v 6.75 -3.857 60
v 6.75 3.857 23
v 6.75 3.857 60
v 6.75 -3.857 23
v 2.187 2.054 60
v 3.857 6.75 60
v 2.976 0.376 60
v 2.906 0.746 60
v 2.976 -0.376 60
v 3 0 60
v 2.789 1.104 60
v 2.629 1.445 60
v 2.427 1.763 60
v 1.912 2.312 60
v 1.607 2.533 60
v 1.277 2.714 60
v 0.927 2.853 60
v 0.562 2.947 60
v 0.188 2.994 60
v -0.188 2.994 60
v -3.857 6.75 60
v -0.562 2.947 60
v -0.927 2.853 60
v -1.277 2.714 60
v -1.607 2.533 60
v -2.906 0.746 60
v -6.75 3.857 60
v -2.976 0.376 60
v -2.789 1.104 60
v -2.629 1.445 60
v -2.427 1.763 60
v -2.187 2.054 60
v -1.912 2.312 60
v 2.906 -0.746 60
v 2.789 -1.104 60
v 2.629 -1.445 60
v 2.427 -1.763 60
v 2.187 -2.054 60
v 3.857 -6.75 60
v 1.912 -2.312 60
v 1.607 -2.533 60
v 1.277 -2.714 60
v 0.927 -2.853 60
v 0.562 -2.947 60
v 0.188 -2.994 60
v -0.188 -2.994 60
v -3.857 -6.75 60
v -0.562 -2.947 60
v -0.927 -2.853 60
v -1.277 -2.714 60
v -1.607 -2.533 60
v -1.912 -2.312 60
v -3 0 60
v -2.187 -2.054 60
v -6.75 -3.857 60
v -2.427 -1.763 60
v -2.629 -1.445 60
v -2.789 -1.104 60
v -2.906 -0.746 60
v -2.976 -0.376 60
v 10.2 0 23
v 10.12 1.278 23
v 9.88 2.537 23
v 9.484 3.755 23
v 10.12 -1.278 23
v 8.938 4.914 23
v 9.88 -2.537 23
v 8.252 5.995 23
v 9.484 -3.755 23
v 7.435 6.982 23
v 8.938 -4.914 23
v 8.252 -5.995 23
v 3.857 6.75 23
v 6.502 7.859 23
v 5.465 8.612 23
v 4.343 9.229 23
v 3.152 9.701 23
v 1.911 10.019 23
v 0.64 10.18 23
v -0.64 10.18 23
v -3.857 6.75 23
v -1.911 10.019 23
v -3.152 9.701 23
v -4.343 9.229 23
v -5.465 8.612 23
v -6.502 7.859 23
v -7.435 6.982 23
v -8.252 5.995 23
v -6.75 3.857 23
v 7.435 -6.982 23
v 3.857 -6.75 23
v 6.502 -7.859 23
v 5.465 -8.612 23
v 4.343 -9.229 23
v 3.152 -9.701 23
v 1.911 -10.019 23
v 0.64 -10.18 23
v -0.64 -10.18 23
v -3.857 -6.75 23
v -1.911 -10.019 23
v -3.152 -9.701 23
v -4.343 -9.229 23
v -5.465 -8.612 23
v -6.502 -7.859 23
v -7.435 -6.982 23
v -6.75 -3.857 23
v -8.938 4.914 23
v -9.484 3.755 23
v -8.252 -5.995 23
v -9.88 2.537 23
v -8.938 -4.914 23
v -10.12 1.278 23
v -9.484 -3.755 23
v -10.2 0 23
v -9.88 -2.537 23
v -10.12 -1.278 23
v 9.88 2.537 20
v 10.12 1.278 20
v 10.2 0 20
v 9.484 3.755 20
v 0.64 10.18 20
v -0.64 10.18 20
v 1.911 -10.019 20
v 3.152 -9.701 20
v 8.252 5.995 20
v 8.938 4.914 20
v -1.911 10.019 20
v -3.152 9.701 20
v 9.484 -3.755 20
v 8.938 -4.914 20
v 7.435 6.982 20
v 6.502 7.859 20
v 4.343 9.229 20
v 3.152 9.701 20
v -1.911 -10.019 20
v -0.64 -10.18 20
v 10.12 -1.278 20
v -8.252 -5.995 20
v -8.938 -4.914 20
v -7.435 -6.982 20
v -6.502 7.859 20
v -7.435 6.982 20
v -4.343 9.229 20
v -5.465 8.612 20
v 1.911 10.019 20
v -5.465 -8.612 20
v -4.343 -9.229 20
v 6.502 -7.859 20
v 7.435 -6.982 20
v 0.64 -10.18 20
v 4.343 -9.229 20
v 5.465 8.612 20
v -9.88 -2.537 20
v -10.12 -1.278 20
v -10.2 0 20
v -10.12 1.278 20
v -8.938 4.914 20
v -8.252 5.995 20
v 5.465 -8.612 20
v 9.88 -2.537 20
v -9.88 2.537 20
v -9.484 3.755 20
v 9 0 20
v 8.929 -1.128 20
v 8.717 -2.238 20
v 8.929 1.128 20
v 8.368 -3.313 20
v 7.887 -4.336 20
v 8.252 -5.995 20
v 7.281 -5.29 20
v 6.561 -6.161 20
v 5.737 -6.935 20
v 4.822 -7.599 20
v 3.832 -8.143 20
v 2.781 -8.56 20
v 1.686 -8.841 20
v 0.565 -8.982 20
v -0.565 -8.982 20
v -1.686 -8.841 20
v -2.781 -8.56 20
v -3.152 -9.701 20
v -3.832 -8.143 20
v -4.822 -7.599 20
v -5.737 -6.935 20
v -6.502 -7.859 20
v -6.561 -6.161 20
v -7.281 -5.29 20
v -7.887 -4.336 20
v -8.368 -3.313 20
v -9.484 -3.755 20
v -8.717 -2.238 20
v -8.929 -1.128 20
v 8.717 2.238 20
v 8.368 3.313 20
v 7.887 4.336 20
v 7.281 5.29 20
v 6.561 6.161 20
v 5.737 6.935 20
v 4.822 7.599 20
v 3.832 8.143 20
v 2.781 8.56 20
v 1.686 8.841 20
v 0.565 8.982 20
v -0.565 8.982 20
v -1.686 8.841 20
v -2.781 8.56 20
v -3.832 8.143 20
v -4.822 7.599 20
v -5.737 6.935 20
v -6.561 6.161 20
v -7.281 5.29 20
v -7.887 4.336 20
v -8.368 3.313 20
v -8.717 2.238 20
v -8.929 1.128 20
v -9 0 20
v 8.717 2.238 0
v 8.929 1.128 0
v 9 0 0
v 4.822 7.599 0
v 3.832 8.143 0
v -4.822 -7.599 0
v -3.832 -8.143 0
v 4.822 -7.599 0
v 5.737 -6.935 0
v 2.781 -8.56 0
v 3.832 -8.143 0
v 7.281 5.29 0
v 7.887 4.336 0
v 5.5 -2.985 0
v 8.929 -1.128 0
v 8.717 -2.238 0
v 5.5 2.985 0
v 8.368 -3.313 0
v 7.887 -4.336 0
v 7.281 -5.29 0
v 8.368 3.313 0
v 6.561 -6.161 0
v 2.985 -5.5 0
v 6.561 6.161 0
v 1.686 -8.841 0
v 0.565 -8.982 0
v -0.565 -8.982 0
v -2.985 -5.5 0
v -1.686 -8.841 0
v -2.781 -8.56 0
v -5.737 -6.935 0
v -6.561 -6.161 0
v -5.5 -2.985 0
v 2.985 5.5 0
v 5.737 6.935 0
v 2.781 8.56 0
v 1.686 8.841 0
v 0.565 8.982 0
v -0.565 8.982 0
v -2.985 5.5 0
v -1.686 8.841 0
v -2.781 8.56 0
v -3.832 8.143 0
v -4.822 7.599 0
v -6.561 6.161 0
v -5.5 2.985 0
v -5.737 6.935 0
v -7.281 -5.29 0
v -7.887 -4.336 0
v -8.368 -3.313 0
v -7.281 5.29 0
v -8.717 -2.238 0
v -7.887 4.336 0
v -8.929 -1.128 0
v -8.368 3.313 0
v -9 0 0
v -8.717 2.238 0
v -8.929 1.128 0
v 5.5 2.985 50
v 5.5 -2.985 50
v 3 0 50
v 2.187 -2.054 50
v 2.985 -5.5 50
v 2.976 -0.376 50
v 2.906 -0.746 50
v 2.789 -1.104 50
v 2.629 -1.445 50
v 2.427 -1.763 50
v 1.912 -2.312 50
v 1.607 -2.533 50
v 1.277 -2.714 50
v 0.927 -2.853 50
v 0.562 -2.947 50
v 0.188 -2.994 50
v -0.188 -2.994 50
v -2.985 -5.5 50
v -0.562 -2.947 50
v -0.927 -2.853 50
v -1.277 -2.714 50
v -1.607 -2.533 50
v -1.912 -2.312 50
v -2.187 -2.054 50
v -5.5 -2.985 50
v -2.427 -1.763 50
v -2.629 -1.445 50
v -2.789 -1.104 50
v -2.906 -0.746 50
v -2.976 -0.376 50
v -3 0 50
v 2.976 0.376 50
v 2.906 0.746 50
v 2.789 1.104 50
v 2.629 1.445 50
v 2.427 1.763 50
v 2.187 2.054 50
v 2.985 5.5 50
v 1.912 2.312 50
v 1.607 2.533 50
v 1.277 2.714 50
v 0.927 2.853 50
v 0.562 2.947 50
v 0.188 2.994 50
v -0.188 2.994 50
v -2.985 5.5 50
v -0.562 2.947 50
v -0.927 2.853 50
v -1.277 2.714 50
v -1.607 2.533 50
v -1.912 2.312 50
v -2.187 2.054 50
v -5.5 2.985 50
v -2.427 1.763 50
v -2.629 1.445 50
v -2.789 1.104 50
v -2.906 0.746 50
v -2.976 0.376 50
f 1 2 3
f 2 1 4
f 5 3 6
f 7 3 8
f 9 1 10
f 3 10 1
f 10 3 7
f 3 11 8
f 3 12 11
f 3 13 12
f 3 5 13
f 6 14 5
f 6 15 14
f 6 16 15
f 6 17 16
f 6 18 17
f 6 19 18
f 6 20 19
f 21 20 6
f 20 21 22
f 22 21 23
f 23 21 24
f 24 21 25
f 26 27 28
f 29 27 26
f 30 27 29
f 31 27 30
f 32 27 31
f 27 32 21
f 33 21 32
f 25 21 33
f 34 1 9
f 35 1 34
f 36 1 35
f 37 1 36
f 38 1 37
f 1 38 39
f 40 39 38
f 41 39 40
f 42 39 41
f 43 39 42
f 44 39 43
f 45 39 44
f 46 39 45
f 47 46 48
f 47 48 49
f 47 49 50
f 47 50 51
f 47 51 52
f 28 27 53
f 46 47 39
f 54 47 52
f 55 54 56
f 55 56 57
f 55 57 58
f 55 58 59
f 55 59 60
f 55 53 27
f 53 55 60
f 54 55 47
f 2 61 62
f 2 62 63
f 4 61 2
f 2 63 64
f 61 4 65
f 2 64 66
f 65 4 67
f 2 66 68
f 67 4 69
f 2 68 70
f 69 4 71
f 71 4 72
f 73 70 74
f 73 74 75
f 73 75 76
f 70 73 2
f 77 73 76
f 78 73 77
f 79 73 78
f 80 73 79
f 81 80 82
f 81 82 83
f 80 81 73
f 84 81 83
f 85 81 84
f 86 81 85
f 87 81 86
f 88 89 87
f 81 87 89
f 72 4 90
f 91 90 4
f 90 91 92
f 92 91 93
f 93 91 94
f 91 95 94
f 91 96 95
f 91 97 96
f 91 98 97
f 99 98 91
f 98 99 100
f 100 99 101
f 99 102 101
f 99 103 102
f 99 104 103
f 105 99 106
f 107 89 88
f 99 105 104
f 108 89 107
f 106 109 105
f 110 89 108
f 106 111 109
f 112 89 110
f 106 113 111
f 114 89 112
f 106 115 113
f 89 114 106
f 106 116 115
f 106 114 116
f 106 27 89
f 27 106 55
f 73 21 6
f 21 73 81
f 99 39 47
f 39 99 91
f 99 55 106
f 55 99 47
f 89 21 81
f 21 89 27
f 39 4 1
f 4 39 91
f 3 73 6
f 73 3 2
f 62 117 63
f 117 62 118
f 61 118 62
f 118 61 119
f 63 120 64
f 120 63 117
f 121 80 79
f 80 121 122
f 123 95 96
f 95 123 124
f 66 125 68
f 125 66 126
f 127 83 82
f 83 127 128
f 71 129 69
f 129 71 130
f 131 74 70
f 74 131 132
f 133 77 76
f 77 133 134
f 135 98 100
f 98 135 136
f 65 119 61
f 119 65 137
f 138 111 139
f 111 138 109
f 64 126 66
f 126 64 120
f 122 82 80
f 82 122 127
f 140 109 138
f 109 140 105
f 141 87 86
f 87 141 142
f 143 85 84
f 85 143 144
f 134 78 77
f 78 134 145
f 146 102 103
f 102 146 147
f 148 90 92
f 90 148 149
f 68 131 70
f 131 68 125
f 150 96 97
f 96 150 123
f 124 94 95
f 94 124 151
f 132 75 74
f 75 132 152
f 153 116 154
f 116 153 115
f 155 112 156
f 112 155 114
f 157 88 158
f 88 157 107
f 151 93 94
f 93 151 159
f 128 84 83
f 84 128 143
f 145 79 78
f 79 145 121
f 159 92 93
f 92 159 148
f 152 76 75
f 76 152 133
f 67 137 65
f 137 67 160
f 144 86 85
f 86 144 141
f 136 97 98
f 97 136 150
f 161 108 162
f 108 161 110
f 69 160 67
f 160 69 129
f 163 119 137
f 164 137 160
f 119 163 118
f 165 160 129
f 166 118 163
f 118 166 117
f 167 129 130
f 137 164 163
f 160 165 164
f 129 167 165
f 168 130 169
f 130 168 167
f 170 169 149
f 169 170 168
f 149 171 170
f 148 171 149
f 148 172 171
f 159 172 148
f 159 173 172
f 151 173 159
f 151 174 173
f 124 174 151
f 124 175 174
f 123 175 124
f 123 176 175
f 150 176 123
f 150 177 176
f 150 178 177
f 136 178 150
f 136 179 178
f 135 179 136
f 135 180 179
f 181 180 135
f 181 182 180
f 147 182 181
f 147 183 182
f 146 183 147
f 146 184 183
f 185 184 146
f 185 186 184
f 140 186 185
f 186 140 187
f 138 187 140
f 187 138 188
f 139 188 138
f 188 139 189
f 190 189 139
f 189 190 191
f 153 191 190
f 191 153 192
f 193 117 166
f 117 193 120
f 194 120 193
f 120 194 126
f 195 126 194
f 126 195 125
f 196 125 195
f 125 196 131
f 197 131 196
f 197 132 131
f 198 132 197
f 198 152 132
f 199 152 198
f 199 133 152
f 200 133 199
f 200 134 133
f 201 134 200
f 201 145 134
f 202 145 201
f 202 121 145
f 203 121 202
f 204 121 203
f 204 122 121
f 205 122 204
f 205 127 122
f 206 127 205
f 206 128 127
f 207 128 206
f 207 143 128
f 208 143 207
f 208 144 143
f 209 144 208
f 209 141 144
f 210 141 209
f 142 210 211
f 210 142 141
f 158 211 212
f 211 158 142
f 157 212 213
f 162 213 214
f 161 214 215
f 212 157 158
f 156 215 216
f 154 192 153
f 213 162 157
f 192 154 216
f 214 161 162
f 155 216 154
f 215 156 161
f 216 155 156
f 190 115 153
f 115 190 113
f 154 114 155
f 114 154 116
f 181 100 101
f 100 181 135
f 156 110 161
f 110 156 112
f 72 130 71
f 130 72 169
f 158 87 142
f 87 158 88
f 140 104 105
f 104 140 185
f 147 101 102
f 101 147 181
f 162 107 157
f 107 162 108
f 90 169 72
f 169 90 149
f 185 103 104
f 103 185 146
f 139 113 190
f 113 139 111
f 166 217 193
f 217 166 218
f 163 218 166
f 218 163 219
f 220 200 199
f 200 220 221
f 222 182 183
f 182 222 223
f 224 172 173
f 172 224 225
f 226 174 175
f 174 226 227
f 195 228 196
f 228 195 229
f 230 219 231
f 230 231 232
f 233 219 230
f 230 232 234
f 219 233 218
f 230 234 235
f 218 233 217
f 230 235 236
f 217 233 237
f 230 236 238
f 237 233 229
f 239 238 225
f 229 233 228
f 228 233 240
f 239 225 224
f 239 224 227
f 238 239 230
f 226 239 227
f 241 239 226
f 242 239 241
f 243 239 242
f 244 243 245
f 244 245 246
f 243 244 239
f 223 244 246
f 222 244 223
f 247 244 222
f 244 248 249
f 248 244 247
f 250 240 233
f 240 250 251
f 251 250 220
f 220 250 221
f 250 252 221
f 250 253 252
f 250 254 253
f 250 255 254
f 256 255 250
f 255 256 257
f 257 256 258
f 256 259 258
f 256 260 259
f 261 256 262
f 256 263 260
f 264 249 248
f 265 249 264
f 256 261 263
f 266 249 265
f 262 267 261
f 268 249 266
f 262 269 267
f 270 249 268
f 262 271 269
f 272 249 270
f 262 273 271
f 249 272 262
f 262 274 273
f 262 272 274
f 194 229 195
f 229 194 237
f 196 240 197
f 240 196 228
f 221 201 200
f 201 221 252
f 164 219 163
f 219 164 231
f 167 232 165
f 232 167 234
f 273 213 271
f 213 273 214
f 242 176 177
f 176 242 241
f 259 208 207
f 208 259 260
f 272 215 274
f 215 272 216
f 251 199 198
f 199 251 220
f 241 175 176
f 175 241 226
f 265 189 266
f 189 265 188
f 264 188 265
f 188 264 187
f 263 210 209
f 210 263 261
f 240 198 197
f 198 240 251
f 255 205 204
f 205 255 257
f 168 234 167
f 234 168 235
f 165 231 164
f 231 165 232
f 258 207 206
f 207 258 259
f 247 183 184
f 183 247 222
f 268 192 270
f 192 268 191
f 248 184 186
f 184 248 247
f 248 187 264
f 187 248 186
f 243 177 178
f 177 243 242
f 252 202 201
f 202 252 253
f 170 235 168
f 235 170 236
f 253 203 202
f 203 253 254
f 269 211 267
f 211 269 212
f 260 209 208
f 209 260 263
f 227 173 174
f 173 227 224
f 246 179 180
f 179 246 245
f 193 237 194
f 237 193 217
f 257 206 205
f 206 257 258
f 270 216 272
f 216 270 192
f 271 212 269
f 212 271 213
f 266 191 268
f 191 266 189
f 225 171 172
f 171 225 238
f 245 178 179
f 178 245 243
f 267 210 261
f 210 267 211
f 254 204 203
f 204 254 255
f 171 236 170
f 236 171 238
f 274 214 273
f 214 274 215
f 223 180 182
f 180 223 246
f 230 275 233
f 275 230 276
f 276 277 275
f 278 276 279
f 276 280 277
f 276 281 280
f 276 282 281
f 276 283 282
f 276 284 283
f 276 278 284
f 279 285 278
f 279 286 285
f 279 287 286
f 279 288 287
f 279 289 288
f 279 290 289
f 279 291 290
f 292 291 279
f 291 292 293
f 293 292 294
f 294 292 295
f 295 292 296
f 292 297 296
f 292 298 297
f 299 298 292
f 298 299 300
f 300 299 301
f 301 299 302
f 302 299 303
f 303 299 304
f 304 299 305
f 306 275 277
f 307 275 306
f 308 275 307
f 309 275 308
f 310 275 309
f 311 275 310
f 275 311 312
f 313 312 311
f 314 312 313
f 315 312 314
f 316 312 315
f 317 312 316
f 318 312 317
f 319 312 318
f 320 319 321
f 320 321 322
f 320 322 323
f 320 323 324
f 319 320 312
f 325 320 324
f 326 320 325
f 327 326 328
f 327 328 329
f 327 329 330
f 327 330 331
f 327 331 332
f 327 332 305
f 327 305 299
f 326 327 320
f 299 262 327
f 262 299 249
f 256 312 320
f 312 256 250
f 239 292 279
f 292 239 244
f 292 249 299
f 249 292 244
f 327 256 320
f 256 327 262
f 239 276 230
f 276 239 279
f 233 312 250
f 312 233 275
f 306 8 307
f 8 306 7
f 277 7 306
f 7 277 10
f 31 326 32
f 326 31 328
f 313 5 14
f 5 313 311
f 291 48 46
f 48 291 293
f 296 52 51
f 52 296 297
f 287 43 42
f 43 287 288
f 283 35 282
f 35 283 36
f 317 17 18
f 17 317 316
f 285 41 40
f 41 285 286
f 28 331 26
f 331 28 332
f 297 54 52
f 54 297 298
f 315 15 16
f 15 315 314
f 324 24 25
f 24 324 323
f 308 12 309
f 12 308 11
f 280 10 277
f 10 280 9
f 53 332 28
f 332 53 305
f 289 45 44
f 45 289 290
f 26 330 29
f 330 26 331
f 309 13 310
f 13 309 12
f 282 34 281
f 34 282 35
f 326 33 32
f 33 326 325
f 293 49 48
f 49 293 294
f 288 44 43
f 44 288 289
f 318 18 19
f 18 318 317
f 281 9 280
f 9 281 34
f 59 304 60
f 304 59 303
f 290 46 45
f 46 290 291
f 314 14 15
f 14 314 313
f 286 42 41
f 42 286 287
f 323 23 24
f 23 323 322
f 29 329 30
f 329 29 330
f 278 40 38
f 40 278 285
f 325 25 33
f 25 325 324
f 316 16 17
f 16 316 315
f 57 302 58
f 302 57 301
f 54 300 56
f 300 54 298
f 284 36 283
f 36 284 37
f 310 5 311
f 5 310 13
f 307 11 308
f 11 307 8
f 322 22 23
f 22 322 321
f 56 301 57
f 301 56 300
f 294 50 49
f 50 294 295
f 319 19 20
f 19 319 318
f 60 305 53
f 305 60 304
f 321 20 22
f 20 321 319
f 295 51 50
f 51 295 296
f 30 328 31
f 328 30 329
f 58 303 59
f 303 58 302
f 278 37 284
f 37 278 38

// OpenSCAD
//Stem Adapter for Cuisinart AFP-7
// 2017 / Ryan Stachurski / http://stachurski.us/


//----------------------Variables of your choice----------------------------------------

//Length from bottom of part up to the bottom of the middle flange
lower_Shaft_Height = 20;      //not sure where to measure for this exactly...

//Radius of the lower part of the shaft
lower_Shaft_Radius = 9;       //guessing (formerly extending same radius upward)

//Width of the void in the lower shaft
lower_Shaft_Void_1 = 11;     //edge length of square1 cross section void

//Width of the void in the lower shaft (rotated 45 degrees)
lower_Shaft_Void_2 = 12;     //edge length of square2

//Height of the flange in the middle of the part
mid_Flange_Height = 3;        //guessing here...

//Radius of the flange in the middle of the part
mid_Flange_Radius = 10.2;     //same as radius on slicing tool collar 

//Length from the top of the middle flange to the top of the part
upper_Shaft_Height = 37;      //length of collar on slicing tool

//Width of the void in the upper shaft
upper_Shaft_Void_1 = 13.5;     //edge length of square1 cross section void in slicing collar 

//Width of the void in the upper shaft (rotated 45 degrees)
upper_Shaft_Void_2 = 15;       //edge length of square2

//Length from the bottom of the part to top of the void inside the part (except the pin hole)
void_Height = 50;            //length of big void inside part except for the pin 

//Radius of the safety pin hole in top of the part 
pin_Radius = 3;



//***************************************************************** NEW ********************
module lowerShaft(){
  difference(){
      
      union(){
          upperShaft();
          midFlange();
          cylinder(lower_Shaft_Height, lower_Shaft_Radius, lower_Shaft_Radius, $fn=50);   
          
      } //end union
      
      intersection(){
          translate([-lower_Shaft_Void_1 / 2, -lower_Shaft_Void_1 / 2, 0])
            cube([lower_Shaft_Void_1,lower_Shaft_Void_1,void_Height]);
      
          rotate([0,0,45])
            translate([-lower_Shaft_Void_2 / 2, -lower_Shaft_Void_2 / 2, 0])
                cube([lower_Shaft_Void_2,lower_Shaft_Void_2,void_Height]);
      } //end lowerShaftVoid intersection
    
      cylinder(lower_Shaft_Height+mid_Flange_Height+upper_Shaft_Height, pin_Radius, pin_Radius, $fn=50);
          
  } //end difference
} //end lowerShaft

module midFlange(){
  
  translate([0,0,lower_Shaft_Height])  
        cylinder(mid_Flange_Height, mid_Flange_Radius, mid_Flange_Radius, $fn=50);
    
} //end midFlange

module upperShaft(){

      intersection(){
          translate([-upper_Shaft_Void_1 / 2, -upper_Shaft_Void_1 / 2, lower_Shaft_Height+mid_Flange_Height])
            cube([upper_Shaft_Void_1,upper_Shaft_Void_1,upper_Shaft_Height]);
      
          rotate([0,0,45])
            translate([-upper_Shaft_Void_2 / 2, -upper_Shaft_Void_2 / 2, lower_Shaft_Height+mid_Flange_Height])
                cube([upper_Shaft_Void_2,upper_Shaft_Void_2,upper_Shaft_Height]);
      } //end lowerShaftVoid intersection
    
    
} //end upperFlange

//Draw the Lower Shaft
lowerShaft();

//Draw the Mid Flange
//midFlange();              //This module was relocated inside the lowerShaft() module to facilitate cutting the center of the part

//Draw the Upper Shaft
//upperShaft();             //This module was relocated inside the lowerShaft() module to facilitate cutting the center of the part
